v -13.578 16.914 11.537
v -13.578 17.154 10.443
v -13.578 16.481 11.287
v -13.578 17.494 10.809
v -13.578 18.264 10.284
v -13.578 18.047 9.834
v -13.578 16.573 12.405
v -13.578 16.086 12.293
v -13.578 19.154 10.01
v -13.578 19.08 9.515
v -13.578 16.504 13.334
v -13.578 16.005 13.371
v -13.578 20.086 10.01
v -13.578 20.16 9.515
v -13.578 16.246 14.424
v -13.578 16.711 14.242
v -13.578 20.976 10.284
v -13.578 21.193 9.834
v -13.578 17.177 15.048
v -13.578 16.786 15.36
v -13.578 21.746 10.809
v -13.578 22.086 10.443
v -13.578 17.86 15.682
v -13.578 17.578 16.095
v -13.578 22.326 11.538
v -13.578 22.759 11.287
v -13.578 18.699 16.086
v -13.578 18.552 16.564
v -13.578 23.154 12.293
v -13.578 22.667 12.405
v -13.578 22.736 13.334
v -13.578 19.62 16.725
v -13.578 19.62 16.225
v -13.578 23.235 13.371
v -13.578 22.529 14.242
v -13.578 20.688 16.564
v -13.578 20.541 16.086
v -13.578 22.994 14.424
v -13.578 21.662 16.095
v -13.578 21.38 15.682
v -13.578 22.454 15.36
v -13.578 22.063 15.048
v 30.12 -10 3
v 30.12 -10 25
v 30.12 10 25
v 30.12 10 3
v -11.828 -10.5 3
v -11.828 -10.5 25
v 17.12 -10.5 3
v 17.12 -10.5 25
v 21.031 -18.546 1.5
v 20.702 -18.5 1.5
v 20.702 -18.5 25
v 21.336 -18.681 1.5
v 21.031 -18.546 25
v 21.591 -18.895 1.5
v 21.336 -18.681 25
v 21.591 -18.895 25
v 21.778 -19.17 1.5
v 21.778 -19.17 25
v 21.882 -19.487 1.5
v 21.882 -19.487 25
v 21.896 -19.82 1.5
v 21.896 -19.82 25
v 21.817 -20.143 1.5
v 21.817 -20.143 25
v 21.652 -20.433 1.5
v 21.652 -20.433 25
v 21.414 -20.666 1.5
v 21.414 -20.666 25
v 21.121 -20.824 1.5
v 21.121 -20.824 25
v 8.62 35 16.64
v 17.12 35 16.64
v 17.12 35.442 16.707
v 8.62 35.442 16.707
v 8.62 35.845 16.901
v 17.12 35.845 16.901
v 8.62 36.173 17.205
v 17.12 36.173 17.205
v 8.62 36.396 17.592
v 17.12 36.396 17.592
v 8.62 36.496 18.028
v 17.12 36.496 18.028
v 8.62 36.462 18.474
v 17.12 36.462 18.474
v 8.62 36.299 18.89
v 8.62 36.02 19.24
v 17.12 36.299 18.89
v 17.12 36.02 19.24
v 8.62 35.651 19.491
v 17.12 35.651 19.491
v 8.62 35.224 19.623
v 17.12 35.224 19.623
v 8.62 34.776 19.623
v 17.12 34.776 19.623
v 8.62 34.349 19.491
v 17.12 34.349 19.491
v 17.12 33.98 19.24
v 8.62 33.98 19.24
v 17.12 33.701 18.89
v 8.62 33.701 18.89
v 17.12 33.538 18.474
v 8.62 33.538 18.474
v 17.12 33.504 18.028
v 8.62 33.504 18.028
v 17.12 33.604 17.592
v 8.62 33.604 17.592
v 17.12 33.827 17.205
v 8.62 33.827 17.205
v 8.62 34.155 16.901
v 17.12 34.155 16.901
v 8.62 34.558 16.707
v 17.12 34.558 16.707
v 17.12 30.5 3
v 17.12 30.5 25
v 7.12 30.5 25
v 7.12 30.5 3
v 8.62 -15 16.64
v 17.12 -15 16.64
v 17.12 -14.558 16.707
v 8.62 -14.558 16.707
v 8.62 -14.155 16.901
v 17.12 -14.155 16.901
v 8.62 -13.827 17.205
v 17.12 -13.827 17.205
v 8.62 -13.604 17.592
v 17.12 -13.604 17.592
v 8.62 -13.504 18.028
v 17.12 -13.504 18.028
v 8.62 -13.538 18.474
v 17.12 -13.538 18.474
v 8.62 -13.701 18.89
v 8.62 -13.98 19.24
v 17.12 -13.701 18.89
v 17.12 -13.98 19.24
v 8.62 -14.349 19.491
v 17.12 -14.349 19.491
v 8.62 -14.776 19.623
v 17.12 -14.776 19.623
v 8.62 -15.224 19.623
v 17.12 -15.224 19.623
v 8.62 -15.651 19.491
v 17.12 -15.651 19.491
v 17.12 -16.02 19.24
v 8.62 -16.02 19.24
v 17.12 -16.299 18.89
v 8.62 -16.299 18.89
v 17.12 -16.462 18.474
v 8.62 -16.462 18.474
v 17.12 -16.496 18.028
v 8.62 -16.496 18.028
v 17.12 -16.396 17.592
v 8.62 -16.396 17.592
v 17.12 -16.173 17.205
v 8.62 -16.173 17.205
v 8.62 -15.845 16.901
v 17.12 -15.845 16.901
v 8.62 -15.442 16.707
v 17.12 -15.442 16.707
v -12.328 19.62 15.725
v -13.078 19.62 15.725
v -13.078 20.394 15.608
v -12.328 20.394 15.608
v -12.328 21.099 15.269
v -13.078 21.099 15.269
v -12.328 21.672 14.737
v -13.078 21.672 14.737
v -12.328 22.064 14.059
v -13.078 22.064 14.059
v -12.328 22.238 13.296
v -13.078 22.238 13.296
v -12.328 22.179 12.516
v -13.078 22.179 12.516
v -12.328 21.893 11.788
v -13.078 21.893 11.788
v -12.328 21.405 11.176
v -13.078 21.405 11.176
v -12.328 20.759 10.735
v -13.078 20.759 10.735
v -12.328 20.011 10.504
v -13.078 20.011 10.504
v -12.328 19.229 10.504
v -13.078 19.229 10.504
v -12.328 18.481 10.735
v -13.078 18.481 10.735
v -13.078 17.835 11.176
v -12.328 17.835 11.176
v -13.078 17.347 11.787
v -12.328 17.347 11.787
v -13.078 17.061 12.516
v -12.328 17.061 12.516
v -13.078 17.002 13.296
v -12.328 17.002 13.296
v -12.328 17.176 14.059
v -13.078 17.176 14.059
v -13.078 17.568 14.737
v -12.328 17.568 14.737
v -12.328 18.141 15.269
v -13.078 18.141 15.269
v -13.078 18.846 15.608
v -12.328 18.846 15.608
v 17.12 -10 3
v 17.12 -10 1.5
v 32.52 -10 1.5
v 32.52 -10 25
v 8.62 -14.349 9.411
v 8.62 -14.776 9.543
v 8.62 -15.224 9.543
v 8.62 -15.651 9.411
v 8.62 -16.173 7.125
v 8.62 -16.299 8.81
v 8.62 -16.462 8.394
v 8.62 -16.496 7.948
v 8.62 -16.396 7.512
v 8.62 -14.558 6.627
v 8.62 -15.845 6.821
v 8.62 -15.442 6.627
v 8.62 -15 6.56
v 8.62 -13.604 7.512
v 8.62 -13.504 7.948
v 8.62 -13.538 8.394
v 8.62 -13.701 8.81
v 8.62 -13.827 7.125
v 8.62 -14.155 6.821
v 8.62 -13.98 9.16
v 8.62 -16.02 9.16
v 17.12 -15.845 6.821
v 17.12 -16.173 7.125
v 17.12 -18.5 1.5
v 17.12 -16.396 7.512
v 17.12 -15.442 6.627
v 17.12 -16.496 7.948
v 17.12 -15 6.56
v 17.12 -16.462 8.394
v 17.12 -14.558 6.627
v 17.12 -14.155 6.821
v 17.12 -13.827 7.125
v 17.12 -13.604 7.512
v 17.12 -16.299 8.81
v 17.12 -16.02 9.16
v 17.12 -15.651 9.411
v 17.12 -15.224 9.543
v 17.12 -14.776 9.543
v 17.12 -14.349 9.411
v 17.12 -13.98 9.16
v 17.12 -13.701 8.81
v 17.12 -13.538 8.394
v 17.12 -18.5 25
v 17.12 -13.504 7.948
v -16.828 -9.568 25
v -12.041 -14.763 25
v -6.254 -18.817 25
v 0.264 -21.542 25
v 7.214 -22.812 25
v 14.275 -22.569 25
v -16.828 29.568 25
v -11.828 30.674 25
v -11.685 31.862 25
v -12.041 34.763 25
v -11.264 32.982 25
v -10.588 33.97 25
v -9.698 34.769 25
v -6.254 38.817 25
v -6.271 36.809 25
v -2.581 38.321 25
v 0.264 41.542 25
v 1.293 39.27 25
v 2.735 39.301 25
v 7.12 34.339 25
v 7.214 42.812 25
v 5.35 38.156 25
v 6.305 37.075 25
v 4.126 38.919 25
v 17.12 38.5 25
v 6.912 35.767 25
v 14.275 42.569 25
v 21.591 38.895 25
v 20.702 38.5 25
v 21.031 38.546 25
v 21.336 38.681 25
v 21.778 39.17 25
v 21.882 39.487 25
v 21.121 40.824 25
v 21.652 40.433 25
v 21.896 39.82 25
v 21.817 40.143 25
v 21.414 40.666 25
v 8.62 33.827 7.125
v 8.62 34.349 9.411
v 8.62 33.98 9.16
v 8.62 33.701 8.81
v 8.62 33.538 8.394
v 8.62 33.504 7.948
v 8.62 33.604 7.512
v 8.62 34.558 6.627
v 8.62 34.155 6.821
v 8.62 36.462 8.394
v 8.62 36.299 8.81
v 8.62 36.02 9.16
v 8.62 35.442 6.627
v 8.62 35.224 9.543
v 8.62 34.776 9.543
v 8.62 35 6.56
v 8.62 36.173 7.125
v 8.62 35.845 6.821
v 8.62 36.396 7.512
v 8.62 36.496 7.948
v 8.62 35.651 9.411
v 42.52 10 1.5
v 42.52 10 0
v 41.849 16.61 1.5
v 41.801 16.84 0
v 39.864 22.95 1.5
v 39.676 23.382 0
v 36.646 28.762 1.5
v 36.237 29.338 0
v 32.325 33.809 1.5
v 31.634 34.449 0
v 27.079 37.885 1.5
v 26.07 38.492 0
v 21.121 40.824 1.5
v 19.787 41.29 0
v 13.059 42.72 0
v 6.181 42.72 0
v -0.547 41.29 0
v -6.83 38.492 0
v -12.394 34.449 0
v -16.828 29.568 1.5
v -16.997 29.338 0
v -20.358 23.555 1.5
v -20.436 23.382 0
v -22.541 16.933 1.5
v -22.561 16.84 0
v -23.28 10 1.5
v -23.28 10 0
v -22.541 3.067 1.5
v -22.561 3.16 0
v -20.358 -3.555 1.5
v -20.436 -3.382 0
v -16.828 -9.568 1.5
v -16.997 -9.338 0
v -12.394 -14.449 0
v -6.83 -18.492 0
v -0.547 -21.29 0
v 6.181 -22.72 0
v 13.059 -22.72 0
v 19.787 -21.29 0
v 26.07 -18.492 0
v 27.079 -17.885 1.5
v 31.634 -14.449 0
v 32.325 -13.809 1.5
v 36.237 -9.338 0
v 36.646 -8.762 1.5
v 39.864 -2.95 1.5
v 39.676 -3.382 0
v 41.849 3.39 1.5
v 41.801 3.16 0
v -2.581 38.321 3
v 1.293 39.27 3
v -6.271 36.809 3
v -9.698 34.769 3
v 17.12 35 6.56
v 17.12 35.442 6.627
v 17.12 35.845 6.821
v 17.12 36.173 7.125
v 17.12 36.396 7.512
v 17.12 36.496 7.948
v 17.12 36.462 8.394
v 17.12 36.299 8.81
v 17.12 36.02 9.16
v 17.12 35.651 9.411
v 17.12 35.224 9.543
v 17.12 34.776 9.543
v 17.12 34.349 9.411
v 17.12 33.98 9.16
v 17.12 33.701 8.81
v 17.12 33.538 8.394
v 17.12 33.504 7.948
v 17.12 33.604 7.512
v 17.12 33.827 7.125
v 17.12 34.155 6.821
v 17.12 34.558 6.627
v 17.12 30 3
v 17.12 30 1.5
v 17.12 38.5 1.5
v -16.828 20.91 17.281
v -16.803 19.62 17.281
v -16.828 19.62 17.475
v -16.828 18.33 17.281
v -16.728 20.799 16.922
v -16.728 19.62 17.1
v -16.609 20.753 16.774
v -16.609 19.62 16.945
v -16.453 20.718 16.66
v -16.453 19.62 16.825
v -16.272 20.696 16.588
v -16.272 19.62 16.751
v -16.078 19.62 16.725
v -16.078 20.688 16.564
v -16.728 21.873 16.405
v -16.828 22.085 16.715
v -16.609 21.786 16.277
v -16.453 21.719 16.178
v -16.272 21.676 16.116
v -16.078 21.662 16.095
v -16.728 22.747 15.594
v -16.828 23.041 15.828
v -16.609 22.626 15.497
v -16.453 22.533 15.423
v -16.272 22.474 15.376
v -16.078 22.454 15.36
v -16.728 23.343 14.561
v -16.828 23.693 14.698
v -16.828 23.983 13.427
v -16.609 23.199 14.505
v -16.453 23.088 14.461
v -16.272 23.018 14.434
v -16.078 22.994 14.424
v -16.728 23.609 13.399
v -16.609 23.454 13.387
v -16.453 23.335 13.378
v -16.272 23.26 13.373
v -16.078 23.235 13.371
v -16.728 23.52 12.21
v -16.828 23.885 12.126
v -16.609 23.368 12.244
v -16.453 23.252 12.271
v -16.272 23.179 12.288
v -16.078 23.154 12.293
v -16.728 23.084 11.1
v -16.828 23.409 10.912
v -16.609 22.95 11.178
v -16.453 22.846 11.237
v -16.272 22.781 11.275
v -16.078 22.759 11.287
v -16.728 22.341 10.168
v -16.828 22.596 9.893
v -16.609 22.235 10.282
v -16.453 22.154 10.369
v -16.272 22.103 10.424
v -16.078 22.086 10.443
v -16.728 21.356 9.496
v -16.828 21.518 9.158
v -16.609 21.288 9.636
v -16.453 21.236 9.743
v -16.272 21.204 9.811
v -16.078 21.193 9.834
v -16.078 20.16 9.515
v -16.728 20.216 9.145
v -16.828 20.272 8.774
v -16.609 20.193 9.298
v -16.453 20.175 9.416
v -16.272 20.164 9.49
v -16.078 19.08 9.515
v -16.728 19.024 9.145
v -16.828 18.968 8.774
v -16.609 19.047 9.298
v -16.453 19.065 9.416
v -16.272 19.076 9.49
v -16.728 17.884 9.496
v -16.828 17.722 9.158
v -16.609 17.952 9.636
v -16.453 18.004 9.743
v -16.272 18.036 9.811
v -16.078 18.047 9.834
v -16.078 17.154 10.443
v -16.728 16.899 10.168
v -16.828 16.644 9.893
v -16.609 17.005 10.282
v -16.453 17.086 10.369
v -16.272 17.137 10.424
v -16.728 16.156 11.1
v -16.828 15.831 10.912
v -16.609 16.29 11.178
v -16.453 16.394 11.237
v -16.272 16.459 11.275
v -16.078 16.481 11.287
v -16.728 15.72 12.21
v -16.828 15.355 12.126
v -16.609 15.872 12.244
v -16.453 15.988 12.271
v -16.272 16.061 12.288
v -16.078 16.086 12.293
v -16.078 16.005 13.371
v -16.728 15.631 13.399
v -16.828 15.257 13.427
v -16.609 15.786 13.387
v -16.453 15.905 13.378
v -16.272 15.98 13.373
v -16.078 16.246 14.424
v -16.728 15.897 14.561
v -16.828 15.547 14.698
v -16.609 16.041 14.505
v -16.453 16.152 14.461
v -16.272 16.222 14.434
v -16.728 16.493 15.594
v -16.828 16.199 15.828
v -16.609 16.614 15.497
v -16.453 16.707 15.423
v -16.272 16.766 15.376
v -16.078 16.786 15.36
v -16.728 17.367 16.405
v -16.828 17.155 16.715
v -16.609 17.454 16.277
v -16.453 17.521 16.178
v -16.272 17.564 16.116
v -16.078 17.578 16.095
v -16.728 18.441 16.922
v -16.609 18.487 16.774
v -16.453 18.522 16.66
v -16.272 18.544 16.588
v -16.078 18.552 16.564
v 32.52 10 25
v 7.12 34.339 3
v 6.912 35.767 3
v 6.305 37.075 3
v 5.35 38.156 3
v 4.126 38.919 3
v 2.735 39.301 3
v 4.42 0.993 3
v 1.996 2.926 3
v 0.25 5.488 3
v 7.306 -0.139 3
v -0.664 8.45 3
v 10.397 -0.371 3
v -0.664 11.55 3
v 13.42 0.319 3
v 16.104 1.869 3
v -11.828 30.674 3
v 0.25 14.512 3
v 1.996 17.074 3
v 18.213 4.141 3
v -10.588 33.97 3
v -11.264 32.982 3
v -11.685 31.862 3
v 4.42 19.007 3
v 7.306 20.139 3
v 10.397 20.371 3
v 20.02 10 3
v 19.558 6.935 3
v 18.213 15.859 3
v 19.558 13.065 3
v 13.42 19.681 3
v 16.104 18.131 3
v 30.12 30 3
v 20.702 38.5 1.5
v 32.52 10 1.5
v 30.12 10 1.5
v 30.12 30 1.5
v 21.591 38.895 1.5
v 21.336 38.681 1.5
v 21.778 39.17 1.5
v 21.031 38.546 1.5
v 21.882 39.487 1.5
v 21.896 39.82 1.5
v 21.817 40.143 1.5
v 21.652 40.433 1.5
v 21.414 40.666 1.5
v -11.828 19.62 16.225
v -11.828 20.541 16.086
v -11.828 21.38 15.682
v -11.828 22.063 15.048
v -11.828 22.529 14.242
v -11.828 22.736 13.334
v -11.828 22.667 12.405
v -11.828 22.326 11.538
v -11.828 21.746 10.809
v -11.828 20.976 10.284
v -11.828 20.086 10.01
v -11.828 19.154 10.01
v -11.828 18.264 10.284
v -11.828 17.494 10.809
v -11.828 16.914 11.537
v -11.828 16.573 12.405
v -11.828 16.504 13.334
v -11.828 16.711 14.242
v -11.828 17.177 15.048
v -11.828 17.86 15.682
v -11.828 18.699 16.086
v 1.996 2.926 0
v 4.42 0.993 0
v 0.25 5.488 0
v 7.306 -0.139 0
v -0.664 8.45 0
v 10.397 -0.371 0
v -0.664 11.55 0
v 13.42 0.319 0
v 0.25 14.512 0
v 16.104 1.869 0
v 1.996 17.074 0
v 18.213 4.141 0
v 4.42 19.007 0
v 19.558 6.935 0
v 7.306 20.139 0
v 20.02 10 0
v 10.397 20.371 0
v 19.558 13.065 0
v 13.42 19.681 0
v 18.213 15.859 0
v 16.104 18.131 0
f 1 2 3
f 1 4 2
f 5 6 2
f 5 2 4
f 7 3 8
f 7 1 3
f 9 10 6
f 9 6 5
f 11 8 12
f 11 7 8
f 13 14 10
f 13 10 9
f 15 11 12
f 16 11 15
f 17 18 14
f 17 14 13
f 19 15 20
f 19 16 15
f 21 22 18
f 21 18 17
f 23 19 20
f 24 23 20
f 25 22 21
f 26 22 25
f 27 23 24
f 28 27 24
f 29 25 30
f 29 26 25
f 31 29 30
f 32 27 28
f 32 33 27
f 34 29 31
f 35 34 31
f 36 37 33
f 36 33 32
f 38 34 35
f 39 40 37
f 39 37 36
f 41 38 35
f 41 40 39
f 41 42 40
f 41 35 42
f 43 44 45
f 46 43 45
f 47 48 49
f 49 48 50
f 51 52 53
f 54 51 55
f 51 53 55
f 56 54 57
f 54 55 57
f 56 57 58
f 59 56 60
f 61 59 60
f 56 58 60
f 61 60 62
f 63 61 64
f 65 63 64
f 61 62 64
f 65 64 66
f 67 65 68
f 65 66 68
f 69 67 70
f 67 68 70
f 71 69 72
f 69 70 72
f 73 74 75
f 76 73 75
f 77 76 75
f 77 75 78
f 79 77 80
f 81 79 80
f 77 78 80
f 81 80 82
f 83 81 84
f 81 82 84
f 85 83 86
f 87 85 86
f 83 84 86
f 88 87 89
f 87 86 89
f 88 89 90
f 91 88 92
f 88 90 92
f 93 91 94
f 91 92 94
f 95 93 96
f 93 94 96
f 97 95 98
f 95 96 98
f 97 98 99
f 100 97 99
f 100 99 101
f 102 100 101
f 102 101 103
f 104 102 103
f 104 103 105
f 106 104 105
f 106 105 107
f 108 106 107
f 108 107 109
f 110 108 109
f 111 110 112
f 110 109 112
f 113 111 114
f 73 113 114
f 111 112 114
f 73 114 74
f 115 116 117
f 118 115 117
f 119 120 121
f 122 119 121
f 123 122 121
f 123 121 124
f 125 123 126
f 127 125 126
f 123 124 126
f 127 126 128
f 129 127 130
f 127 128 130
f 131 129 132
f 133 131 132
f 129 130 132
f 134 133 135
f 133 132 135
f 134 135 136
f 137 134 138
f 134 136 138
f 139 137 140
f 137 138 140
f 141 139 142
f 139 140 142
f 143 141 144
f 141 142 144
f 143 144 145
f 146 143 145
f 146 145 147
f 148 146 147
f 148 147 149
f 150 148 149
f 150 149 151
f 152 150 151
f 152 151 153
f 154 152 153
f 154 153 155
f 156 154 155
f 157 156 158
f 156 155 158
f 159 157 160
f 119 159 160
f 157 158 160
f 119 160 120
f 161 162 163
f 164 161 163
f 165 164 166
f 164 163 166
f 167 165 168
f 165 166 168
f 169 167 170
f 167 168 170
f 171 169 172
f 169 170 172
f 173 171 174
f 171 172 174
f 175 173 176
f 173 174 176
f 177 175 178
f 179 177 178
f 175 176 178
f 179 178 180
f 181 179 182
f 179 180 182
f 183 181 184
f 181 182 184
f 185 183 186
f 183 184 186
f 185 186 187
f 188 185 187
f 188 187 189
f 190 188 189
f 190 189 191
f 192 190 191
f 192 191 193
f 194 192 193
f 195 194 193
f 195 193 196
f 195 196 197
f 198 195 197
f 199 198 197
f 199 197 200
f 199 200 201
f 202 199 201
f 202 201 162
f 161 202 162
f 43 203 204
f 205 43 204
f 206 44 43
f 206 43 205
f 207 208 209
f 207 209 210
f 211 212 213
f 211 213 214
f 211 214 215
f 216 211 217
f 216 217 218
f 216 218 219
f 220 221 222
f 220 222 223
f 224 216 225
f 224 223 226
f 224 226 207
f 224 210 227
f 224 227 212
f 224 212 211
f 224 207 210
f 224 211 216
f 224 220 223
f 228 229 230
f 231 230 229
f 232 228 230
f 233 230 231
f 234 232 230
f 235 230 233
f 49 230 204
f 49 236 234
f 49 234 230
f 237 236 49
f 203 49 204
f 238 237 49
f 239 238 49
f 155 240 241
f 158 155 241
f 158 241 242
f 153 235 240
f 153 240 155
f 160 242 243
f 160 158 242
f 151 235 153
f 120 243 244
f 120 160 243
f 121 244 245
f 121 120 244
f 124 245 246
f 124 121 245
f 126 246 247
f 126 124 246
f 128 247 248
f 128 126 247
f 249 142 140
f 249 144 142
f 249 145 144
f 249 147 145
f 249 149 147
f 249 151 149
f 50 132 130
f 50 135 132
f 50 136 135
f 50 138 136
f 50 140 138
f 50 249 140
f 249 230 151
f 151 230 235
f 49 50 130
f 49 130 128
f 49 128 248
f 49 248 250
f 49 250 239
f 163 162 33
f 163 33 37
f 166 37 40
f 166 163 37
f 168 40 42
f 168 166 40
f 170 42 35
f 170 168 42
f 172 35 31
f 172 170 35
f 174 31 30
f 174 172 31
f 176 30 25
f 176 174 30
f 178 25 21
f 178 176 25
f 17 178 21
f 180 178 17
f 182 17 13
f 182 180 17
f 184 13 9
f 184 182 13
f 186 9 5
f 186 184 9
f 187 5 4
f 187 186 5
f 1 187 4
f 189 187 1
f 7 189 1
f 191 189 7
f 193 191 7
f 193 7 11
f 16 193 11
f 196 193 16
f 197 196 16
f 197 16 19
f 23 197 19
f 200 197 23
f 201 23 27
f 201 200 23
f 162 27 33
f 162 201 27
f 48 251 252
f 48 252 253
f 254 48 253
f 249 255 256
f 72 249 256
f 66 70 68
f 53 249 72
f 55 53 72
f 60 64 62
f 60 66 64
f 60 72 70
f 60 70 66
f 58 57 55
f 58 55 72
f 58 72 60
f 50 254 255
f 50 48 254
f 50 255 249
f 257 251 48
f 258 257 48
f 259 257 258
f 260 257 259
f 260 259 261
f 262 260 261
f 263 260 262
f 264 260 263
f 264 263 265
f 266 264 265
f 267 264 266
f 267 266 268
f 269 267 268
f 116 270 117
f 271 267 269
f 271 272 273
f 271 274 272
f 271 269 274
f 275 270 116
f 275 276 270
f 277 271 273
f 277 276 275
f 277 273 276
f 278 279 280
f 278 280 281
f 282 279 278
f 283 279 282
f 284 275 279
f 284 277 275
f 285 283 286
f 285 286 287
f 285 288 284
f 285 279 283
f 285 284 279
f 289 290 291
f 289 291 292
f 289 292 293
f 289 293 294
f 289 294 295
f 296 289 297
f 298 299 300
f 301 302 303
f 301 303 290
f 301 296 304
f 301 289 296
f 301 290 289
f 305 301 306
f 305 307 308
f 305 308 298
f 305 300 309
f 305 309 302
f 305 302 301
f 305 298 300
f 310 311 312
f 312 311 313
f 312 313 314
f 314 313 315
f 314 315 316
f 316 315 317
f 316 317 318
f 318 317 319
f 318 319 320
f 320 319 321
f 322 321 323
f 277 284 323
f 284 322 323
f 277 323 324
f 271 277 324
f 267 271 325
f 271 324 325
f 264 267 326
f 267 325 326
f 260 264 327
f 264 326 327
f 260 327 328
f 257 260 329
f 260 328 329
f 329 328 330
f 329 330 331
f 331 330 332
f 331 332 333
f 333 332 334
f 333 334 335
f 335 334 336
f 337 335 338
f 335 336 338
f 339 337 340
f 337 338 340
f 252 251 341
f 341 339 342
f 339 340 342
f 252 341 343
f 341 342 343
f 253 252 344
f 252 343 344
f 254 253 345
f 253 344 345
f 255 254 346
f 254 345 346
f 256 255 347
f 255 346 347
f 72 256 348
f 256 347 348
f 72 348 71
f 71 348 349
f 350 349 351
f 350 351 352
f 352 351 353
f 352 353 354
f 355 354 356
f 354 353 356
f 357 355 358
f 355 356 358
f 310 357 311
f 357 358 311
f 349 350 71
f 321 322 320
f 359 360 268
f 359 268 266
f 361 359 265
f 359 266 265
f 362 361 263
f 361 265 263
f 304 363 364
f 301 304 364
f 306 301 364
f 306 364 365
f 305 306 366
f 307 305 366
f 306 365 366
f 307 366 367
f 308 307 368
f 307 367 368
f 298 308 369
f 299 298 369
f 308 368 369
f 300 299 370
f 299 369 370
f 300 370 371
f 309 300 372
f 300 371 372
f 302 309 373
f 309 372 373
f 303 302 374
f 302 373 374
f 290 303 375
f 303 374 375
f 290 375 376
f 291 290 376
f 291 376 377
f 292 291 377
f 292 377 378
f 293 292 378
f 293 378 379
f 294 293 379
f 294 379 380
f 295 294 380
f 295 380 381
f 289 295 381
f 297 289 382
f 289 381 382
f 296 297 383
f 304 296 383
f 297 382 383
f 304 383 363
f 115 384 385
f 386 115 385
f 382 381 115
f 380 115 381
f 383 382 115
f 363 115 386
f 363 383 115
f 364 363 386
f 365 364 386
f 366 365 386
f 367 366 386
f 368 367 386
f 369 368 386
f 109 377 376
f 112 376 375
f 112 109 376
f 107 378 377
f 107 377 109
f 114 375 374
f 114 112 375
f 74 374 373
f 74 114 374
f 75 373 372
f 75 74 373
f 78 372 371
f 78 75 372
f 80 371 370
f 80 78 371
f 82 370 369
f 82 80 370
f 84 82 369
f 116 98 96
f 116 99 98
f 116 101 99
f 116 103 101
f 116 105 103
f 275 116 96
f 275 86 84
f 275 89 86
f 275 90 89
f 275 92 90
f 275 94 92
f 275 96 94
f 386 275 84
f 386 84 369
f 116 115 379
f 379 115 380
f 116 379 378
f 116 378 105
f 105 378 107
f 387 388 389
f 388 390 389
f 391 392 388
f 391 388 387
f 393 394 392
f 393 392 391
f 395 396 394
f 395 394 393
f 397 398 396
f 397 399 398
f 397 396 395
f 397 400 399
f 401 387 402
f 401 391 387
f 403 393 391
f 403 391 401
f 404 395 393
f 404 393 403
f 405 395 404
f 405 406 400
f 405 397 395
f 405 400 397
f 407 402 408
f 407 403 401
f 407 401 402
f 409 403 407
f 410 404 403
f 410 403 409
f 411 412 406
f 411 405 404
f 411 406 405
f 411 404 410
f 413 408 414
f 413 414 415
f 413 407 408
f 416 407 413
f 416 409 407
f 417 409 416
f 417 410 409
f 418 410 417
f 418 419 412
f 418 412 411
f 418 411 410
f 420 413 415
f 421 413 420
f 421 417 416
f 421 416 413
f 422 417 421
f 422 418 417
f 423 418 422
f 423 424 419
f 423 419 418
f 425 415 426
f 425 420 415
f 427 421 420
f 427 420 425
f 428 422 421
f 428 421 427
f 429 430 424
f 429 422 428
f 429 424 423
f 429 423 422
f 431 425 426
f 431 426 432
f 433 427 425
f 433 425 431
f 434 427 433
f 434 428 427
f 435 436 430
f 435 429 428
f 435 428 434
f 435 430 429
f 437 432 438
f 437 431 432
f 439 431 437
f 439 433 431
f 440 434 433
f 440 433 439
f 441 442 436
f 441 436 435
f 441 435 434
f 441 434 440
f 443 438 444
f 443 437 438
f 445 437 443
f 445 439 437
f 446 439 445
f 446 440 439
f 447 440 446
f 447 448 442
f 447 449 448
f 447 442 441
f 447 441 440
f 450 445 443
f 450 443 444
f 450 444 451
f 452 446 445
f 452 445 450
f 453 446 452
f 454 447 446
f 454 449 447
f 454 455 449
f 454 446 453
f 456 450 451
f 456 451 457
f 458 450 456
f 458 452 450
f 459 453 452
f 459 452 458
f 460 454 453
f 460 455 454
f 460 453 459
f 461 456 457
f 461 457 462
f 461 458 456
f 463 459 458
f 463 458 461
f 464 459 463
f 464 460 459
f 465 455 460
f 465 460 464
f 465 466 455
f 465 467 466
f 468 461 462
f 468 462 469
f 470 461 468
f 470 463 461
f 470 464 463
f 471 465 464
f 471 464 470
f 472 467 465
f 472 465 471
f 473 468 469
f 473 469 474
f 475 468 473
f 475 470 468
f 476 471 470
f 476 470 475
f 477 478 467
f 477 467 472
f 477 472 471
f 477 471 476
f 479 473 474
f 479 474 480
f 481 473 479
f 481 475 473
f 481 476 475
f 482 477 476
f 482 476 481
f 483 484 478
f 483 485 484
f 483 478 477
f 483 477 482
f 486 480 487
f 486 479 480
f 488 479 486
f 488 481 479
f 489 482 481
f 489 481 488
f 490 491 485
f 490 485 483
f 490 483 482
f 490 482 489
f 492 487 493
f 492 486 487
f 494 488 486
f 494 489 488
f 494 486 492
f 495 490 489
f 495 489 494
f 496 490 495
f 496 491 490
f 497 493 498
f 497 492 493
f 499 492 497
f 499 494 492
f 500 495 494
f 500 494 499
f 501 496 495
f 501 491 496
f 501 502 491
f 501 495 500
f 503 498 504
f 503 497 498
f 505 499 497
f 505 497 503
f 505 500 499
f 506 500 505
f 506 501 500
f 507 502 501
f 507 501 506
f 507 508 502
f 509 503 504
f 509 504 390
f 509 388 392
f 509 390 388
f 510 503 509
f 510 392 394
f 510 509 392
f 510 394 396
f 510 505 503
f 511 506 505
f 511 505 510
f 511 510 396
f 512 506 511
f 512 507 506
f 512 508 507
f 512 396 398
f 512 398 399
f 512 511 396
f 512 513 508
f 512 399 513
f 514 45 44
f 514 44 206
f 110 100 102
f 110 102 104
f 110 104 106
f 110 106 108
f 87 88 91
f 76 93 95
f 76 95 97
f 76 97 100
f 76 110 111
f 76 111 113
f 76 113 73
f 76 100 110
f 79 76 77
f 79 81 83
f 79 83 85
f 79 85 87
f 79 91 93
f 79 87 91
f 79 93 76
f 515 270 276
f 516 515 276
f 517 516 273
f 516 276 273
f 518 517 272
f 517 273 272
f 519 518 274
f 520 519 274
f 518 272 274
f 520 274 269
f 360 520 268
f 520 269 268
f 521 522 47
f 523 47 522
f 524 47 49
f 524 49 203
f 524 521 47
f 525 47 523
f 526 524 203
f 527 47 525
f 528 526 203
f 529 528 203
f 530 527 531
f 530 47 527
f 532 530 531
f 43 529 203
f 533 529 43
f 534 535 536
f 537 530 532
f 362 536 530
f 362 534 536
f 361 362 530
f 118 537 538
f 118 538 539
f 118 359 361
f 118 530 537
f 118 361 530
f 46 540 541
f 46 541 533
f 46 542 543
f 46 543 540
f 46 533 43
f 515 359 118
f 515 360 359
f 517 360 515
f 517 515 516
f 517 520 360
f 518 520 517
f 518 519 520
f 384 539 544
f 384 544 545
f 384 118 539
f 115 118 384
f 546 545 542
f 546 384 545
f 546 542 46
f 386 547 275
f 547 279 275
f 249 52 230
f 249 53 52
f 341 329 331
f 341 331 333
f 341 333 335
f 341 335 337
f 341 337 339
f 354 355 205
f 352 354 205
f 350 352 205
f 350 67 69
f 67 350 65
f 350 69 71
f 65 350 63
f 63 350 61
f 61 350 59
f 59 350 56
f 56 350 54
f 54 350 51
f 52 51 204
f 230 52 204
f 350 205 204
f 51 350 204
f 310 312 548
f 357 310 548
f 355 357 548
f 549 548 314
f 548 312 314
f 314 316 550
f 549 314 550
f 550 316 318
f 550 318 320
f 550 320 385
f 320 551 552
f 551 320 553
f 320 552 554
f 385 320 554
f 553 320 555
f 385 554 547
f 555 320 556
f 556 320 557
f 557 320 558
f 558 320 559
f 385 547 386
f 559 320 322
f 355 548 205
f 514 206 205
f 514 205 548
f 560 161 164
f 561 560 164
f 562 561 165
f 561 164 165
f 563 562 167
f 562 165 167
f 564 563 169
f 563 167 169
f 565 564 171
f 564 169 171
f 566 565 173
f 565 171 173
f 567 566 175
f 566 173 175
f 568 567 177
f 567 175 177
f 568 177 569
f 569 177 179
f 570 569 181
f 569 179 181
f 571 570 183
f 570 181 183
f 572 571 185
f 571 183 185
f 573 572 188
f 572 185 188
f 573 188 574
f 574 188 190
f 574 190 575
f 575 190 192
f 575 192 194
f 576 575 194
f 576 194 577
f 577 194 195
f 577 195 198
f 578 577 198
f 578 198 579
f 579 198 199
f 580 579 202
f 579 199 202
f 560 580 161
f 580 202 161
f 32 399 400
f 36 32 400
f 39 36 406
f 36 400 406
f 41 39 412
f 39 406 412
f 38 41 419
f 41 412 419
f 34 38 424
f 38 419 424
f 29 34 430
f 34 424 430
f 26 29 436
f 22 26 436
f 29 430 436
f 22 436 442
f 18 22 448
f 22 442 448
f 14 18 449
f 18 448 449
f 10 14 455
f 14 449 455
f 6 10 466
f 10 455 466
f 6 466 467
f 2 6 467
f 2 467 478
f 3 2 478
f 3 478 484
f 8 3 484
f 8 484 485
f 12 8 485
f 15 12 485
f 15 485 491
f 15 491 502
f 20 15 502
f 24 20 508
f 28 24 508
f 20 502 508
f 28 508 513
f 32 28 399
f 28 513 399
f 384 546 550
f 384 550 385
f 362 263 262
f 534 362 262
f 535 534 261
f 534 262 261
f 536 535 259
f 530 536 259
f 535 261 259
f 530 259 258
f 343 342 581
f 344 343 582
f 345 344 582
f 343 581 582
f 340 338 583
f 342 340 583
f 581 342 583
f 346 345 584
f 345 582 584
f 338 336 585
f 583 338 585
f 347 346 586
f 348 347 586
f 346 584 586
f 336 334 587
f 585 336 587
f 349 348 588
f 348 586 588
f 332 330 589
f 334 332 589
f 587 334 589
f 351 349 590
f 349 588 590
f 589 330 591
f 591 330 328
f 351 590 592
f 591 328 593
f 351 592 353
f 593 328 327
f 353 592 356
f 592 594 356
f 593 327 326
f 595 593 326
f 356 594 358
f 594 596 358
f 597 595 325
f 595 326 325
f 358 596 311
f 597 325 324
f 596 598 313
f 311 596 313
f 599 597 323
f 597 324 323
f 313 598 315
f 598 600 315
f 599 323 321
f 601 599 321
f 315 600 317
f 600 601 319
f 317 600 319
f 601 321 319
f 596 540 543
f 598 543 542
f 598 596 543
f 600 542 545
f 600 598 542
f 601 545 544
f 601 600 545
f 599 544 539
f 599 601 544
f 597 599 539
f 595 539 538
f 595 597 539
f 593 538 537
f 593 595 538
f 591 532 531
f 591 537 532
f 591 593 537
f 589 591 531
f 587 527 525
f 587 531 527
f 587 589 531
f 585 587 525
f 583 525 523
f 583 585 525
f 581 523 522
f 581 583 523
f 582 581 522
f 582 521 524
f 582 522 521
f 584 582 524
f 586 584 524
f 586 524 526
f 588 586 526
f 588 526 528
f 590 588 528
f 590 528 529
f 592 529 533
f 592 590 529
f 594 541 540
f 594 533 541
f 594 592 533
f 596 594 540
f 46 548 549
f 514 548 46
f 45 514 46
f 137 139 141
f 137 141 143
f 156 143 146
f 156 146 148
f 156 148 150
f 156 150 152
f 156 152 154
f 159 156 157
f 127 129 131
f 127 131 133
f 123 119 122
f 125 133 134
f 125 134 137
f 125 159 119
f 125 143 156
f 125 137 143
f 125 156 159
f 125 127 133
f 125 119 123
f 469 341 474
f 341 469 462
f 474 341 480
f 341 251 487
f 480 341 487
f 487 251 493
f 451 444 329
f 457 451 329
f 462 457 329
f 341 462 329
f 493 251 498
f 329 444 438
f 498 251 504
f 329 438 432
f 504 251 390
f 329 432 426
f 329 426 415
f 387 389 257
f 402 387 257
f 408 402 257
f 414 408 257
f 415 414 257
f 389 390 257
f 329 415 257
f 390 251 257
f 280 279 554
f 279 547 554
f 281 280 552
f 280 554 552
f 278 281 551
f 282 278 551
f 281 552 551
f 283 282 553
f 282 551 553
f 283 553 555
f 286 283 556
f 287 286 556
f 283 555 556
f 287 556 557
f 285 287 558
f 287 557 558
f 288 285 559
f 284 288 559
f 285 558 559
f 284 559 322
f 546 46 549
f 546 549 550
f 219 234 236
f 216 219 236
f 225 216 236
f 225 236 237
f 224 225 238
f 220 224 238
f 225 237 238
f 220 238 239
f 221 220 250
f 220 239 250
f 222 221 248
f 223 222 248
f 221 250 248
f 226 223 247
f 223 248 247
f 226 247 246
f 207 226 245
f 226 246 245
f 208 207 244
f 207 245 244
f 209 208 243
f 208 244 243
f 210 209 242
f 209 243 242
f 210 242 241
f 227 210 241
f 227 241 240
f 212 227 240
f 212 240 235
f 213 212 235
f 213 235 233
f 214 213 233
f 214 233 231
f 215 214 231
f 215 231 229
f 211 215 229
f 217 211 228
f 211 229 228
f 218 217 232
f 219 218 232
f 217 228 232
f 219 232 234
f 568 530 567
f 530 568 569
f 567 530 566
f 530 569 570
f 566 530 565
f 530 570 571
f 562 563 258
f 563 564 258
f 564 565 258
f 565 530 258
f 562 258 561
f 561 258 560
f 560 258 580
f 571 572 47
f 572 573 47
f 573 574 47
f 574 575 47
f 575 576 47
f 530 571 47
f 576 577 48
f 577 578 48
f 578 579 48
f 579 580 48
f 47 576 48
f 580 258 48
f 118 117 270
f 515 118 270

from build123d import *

# Parameters (mm, degrees)
SKETCH2_R           = 32.9
SKETCH2_R_2         = 10.4
BOSS_EXTRUDE1_DEPTH = 25
SKETCH4_W           = 2.4
SKETCH4_H           = 20
CUT_EXTRUDE1_DEPTH  = 22
CUT_EXTRUDE2_DEPTH  = 1.5
SKETCH6_R           = 3.625
CUT_EXTRUDE3_DEPTH  = 3.25
FILLET1_R           = 0.75
CUT_EXTRUDE4_REACH  = 58.098
SKETCH7_R           = 2.625
CHAMFER1_SIZE       = 0.5
SKETCH8_R           = 1.5
CUT_EXTRUDE5_DEPTH  = 8.5
FILLET2_R           = 1.2


with BuildPart() as part:
    # Sketch2 → Boss-Extrude1 (new body)
    with BuildSketch(Plane.XY):
        with Locations((9.62, 10)):
            Circle(SKETCH2_R)
        with Locations((9.62, 10)):
            Circle(SKETCH2_R_2, mode=Mode.SUBTRACT)
    extrude(amount=BOSS_EXTRUDE1_DEPTH)

    # Sketch4 → Cut-Extrude1 (cut)
    with BuildSketch(Plane.XY.offset(25)):
        with BuildLine():
            Line((-11.82822809, -10.5), (17.12, -10.5))
            Line((17.12, -10.5), (17.12, -18.5))
            Line((17.12, -18.5), (26.056544649, -18.5))
            ThreePointArc((26.056544649, -18.5), (42.52, 10), (26.056544649, 38.5))
            Line((26.056544649, 38.5), (17.12, 38.5))
            Line((17.12, 38.5), (17.12, 30.5))
            Line((17.12, 30.5), (7.12, 30.5))
            Line((7.12, 30.5), (7.12, 34.339279361))
            ThreePointArc((7.12, 34.339279361), (5.349790899, 38.156143355), (1.292619701, 39.270348397))
            ThreePointArc((1.292619701, 39.270348397), (-4.45403874, 37.633425382), (-9.697773665, 34.768666365))
            ThreePointArc((-9.697773665, 34.768666365), (-11.263751051, 32.981913664), (-11.82822809, 30.674071368))
            Line((-11.82822809, 30.674071368), (-11.82822809, -10.5))
        make_face()
        with Locations((31.32, 0)):
            Rectangle(SKETCH4_W, SKETCH4_H, mode=Mode.SUBTRACT)
        with BuildLine():
            Line((-16.82822809, -9.567862195), (-16.82822809, 29.567862195))
            ThreePointArc((-16.82822809, 29.567862195), (-23.28, 10), (-16.82822809, -9.567862195))
        make_face()
    extrude(amount=-CUT_EXTRUDE1_DEPTH, mode=Mode.SUBTRACT)

    # Sketch5 → Cut-Extrude2 (cut)
    with BuildSketch(Plane.XY.offset(3)):
        with BuildLine():
            Line((17.12, 38.5), (26.056544649, 38.5))
            ThreePointArc((26.056544649, 38.5), (42.52, 10), (26.056544649, -18.5))
            Line((26.056544649, -18.5), (17.12, -18.5))
            Line((17.12, -18.5), (17.12, -10))
            Line((17.12, -10), (32.52, -10))
            Line((32.52, -10), (32.52, 10))
            Line((32.52, 10), (30.12, 10))
            Line((30.12, 10), (30.12, 30))
            Line((30.12, 30), (17.12, 30))
            Line((17.12, 30), (17.12, 38.5))
        make_face()
        with BuildLine():
            Line((-16.82822809, -9.567862195), (-16.82822809, 29.567862195))
            ThreePointArc((-16.82822809, 29.567862195), (-23.28, 10), (-16.82822809, -9.567862195))
        make_face()
    extrude(amount=-CUT_EXTRUDE2_DEPTH, mode=Mode.SUBTRACT)

    # Sketch6 → Cut-Extrude3 (cut)
    with BuildSketch(Plane.ZY.offset(16.82822809)):
        with Locations((13.1, 19.62)):
            Circle(SKETCH6_R)
    extrude(amount=-CUT_EXTRUDE3_DEPTH, mode=Mode.SUBTRACT)

    # Fillet1
    fillet1_edges = [part.edges().sort_by_distance(p)[0] for p in [
        (-16.82822809, 19.62, 9.475),
    ]]
    fillet(fillet1_edges, radius=FILLET1_R)

    # Sketch7 → Cut-Extrude4 (cut, up to next)
    with BuildSketch(Plane.ZY.offset(13.57822809), mode=Mode.PRIVATE) as cut_extrude4_sk1:
        with Locations((13.1, 19.62)):
            Circle(SKETCH7_R)
    cut_extrude4_tool1 = extrude(cut_extrude4_sk1.sketch, amount=-CUT_EXTRUDE4_REACH, mode=Mode.PRIVATE) & part.part
    add(cut_extrude4_tool1.solids().sort_by_distance((-13.578228, 19.62, 13.1))[0], mode=Mode.SUBTRACT)

    # Chamfer1
    chamfer1_edges = [part.edges().sort_by_distance(p)[0] for p in [
        (-13.57822809, 19.62, 10.475),
        (-11.82822809, 19.62, 10.475),
    ]]
    chamfer(chamfer1_edges, length=CHAMFER1_SIZE)

    # Sketch8 → Cut-Extrude5 (cut)
    with BuildSketch(Plane(origin=(17.12, 0, 0), x_dir=(0, 0, -1), z_dir=(1, 0, 0))):
        with Locations((-18.14, -15)):
            Circle(SKETCH8_R)
        with Locations((-8.06, -15)):
            Circle(SKETCH8_R)
        with Locations((-18.14, 35)):
            Circle(SKETCH8_R)
        with Locations((-8.06, 35)):
            Circle(SKETCH8_R)
    extrude(amount=-CUT_EXTRUDE5_DEPTH, mode=Mode.SUBTRACT)

    # Fillet2
    fillet2_edges = [part.edges().sort_by_distance(p)[0] for p in [
        (26.056544649, -18.5, 13.25),
        (26.056544649, 38.5, 13.25),
    ]]
    fillet(fillet2_edges, radius=FILLET2_R)


solid = part.part
